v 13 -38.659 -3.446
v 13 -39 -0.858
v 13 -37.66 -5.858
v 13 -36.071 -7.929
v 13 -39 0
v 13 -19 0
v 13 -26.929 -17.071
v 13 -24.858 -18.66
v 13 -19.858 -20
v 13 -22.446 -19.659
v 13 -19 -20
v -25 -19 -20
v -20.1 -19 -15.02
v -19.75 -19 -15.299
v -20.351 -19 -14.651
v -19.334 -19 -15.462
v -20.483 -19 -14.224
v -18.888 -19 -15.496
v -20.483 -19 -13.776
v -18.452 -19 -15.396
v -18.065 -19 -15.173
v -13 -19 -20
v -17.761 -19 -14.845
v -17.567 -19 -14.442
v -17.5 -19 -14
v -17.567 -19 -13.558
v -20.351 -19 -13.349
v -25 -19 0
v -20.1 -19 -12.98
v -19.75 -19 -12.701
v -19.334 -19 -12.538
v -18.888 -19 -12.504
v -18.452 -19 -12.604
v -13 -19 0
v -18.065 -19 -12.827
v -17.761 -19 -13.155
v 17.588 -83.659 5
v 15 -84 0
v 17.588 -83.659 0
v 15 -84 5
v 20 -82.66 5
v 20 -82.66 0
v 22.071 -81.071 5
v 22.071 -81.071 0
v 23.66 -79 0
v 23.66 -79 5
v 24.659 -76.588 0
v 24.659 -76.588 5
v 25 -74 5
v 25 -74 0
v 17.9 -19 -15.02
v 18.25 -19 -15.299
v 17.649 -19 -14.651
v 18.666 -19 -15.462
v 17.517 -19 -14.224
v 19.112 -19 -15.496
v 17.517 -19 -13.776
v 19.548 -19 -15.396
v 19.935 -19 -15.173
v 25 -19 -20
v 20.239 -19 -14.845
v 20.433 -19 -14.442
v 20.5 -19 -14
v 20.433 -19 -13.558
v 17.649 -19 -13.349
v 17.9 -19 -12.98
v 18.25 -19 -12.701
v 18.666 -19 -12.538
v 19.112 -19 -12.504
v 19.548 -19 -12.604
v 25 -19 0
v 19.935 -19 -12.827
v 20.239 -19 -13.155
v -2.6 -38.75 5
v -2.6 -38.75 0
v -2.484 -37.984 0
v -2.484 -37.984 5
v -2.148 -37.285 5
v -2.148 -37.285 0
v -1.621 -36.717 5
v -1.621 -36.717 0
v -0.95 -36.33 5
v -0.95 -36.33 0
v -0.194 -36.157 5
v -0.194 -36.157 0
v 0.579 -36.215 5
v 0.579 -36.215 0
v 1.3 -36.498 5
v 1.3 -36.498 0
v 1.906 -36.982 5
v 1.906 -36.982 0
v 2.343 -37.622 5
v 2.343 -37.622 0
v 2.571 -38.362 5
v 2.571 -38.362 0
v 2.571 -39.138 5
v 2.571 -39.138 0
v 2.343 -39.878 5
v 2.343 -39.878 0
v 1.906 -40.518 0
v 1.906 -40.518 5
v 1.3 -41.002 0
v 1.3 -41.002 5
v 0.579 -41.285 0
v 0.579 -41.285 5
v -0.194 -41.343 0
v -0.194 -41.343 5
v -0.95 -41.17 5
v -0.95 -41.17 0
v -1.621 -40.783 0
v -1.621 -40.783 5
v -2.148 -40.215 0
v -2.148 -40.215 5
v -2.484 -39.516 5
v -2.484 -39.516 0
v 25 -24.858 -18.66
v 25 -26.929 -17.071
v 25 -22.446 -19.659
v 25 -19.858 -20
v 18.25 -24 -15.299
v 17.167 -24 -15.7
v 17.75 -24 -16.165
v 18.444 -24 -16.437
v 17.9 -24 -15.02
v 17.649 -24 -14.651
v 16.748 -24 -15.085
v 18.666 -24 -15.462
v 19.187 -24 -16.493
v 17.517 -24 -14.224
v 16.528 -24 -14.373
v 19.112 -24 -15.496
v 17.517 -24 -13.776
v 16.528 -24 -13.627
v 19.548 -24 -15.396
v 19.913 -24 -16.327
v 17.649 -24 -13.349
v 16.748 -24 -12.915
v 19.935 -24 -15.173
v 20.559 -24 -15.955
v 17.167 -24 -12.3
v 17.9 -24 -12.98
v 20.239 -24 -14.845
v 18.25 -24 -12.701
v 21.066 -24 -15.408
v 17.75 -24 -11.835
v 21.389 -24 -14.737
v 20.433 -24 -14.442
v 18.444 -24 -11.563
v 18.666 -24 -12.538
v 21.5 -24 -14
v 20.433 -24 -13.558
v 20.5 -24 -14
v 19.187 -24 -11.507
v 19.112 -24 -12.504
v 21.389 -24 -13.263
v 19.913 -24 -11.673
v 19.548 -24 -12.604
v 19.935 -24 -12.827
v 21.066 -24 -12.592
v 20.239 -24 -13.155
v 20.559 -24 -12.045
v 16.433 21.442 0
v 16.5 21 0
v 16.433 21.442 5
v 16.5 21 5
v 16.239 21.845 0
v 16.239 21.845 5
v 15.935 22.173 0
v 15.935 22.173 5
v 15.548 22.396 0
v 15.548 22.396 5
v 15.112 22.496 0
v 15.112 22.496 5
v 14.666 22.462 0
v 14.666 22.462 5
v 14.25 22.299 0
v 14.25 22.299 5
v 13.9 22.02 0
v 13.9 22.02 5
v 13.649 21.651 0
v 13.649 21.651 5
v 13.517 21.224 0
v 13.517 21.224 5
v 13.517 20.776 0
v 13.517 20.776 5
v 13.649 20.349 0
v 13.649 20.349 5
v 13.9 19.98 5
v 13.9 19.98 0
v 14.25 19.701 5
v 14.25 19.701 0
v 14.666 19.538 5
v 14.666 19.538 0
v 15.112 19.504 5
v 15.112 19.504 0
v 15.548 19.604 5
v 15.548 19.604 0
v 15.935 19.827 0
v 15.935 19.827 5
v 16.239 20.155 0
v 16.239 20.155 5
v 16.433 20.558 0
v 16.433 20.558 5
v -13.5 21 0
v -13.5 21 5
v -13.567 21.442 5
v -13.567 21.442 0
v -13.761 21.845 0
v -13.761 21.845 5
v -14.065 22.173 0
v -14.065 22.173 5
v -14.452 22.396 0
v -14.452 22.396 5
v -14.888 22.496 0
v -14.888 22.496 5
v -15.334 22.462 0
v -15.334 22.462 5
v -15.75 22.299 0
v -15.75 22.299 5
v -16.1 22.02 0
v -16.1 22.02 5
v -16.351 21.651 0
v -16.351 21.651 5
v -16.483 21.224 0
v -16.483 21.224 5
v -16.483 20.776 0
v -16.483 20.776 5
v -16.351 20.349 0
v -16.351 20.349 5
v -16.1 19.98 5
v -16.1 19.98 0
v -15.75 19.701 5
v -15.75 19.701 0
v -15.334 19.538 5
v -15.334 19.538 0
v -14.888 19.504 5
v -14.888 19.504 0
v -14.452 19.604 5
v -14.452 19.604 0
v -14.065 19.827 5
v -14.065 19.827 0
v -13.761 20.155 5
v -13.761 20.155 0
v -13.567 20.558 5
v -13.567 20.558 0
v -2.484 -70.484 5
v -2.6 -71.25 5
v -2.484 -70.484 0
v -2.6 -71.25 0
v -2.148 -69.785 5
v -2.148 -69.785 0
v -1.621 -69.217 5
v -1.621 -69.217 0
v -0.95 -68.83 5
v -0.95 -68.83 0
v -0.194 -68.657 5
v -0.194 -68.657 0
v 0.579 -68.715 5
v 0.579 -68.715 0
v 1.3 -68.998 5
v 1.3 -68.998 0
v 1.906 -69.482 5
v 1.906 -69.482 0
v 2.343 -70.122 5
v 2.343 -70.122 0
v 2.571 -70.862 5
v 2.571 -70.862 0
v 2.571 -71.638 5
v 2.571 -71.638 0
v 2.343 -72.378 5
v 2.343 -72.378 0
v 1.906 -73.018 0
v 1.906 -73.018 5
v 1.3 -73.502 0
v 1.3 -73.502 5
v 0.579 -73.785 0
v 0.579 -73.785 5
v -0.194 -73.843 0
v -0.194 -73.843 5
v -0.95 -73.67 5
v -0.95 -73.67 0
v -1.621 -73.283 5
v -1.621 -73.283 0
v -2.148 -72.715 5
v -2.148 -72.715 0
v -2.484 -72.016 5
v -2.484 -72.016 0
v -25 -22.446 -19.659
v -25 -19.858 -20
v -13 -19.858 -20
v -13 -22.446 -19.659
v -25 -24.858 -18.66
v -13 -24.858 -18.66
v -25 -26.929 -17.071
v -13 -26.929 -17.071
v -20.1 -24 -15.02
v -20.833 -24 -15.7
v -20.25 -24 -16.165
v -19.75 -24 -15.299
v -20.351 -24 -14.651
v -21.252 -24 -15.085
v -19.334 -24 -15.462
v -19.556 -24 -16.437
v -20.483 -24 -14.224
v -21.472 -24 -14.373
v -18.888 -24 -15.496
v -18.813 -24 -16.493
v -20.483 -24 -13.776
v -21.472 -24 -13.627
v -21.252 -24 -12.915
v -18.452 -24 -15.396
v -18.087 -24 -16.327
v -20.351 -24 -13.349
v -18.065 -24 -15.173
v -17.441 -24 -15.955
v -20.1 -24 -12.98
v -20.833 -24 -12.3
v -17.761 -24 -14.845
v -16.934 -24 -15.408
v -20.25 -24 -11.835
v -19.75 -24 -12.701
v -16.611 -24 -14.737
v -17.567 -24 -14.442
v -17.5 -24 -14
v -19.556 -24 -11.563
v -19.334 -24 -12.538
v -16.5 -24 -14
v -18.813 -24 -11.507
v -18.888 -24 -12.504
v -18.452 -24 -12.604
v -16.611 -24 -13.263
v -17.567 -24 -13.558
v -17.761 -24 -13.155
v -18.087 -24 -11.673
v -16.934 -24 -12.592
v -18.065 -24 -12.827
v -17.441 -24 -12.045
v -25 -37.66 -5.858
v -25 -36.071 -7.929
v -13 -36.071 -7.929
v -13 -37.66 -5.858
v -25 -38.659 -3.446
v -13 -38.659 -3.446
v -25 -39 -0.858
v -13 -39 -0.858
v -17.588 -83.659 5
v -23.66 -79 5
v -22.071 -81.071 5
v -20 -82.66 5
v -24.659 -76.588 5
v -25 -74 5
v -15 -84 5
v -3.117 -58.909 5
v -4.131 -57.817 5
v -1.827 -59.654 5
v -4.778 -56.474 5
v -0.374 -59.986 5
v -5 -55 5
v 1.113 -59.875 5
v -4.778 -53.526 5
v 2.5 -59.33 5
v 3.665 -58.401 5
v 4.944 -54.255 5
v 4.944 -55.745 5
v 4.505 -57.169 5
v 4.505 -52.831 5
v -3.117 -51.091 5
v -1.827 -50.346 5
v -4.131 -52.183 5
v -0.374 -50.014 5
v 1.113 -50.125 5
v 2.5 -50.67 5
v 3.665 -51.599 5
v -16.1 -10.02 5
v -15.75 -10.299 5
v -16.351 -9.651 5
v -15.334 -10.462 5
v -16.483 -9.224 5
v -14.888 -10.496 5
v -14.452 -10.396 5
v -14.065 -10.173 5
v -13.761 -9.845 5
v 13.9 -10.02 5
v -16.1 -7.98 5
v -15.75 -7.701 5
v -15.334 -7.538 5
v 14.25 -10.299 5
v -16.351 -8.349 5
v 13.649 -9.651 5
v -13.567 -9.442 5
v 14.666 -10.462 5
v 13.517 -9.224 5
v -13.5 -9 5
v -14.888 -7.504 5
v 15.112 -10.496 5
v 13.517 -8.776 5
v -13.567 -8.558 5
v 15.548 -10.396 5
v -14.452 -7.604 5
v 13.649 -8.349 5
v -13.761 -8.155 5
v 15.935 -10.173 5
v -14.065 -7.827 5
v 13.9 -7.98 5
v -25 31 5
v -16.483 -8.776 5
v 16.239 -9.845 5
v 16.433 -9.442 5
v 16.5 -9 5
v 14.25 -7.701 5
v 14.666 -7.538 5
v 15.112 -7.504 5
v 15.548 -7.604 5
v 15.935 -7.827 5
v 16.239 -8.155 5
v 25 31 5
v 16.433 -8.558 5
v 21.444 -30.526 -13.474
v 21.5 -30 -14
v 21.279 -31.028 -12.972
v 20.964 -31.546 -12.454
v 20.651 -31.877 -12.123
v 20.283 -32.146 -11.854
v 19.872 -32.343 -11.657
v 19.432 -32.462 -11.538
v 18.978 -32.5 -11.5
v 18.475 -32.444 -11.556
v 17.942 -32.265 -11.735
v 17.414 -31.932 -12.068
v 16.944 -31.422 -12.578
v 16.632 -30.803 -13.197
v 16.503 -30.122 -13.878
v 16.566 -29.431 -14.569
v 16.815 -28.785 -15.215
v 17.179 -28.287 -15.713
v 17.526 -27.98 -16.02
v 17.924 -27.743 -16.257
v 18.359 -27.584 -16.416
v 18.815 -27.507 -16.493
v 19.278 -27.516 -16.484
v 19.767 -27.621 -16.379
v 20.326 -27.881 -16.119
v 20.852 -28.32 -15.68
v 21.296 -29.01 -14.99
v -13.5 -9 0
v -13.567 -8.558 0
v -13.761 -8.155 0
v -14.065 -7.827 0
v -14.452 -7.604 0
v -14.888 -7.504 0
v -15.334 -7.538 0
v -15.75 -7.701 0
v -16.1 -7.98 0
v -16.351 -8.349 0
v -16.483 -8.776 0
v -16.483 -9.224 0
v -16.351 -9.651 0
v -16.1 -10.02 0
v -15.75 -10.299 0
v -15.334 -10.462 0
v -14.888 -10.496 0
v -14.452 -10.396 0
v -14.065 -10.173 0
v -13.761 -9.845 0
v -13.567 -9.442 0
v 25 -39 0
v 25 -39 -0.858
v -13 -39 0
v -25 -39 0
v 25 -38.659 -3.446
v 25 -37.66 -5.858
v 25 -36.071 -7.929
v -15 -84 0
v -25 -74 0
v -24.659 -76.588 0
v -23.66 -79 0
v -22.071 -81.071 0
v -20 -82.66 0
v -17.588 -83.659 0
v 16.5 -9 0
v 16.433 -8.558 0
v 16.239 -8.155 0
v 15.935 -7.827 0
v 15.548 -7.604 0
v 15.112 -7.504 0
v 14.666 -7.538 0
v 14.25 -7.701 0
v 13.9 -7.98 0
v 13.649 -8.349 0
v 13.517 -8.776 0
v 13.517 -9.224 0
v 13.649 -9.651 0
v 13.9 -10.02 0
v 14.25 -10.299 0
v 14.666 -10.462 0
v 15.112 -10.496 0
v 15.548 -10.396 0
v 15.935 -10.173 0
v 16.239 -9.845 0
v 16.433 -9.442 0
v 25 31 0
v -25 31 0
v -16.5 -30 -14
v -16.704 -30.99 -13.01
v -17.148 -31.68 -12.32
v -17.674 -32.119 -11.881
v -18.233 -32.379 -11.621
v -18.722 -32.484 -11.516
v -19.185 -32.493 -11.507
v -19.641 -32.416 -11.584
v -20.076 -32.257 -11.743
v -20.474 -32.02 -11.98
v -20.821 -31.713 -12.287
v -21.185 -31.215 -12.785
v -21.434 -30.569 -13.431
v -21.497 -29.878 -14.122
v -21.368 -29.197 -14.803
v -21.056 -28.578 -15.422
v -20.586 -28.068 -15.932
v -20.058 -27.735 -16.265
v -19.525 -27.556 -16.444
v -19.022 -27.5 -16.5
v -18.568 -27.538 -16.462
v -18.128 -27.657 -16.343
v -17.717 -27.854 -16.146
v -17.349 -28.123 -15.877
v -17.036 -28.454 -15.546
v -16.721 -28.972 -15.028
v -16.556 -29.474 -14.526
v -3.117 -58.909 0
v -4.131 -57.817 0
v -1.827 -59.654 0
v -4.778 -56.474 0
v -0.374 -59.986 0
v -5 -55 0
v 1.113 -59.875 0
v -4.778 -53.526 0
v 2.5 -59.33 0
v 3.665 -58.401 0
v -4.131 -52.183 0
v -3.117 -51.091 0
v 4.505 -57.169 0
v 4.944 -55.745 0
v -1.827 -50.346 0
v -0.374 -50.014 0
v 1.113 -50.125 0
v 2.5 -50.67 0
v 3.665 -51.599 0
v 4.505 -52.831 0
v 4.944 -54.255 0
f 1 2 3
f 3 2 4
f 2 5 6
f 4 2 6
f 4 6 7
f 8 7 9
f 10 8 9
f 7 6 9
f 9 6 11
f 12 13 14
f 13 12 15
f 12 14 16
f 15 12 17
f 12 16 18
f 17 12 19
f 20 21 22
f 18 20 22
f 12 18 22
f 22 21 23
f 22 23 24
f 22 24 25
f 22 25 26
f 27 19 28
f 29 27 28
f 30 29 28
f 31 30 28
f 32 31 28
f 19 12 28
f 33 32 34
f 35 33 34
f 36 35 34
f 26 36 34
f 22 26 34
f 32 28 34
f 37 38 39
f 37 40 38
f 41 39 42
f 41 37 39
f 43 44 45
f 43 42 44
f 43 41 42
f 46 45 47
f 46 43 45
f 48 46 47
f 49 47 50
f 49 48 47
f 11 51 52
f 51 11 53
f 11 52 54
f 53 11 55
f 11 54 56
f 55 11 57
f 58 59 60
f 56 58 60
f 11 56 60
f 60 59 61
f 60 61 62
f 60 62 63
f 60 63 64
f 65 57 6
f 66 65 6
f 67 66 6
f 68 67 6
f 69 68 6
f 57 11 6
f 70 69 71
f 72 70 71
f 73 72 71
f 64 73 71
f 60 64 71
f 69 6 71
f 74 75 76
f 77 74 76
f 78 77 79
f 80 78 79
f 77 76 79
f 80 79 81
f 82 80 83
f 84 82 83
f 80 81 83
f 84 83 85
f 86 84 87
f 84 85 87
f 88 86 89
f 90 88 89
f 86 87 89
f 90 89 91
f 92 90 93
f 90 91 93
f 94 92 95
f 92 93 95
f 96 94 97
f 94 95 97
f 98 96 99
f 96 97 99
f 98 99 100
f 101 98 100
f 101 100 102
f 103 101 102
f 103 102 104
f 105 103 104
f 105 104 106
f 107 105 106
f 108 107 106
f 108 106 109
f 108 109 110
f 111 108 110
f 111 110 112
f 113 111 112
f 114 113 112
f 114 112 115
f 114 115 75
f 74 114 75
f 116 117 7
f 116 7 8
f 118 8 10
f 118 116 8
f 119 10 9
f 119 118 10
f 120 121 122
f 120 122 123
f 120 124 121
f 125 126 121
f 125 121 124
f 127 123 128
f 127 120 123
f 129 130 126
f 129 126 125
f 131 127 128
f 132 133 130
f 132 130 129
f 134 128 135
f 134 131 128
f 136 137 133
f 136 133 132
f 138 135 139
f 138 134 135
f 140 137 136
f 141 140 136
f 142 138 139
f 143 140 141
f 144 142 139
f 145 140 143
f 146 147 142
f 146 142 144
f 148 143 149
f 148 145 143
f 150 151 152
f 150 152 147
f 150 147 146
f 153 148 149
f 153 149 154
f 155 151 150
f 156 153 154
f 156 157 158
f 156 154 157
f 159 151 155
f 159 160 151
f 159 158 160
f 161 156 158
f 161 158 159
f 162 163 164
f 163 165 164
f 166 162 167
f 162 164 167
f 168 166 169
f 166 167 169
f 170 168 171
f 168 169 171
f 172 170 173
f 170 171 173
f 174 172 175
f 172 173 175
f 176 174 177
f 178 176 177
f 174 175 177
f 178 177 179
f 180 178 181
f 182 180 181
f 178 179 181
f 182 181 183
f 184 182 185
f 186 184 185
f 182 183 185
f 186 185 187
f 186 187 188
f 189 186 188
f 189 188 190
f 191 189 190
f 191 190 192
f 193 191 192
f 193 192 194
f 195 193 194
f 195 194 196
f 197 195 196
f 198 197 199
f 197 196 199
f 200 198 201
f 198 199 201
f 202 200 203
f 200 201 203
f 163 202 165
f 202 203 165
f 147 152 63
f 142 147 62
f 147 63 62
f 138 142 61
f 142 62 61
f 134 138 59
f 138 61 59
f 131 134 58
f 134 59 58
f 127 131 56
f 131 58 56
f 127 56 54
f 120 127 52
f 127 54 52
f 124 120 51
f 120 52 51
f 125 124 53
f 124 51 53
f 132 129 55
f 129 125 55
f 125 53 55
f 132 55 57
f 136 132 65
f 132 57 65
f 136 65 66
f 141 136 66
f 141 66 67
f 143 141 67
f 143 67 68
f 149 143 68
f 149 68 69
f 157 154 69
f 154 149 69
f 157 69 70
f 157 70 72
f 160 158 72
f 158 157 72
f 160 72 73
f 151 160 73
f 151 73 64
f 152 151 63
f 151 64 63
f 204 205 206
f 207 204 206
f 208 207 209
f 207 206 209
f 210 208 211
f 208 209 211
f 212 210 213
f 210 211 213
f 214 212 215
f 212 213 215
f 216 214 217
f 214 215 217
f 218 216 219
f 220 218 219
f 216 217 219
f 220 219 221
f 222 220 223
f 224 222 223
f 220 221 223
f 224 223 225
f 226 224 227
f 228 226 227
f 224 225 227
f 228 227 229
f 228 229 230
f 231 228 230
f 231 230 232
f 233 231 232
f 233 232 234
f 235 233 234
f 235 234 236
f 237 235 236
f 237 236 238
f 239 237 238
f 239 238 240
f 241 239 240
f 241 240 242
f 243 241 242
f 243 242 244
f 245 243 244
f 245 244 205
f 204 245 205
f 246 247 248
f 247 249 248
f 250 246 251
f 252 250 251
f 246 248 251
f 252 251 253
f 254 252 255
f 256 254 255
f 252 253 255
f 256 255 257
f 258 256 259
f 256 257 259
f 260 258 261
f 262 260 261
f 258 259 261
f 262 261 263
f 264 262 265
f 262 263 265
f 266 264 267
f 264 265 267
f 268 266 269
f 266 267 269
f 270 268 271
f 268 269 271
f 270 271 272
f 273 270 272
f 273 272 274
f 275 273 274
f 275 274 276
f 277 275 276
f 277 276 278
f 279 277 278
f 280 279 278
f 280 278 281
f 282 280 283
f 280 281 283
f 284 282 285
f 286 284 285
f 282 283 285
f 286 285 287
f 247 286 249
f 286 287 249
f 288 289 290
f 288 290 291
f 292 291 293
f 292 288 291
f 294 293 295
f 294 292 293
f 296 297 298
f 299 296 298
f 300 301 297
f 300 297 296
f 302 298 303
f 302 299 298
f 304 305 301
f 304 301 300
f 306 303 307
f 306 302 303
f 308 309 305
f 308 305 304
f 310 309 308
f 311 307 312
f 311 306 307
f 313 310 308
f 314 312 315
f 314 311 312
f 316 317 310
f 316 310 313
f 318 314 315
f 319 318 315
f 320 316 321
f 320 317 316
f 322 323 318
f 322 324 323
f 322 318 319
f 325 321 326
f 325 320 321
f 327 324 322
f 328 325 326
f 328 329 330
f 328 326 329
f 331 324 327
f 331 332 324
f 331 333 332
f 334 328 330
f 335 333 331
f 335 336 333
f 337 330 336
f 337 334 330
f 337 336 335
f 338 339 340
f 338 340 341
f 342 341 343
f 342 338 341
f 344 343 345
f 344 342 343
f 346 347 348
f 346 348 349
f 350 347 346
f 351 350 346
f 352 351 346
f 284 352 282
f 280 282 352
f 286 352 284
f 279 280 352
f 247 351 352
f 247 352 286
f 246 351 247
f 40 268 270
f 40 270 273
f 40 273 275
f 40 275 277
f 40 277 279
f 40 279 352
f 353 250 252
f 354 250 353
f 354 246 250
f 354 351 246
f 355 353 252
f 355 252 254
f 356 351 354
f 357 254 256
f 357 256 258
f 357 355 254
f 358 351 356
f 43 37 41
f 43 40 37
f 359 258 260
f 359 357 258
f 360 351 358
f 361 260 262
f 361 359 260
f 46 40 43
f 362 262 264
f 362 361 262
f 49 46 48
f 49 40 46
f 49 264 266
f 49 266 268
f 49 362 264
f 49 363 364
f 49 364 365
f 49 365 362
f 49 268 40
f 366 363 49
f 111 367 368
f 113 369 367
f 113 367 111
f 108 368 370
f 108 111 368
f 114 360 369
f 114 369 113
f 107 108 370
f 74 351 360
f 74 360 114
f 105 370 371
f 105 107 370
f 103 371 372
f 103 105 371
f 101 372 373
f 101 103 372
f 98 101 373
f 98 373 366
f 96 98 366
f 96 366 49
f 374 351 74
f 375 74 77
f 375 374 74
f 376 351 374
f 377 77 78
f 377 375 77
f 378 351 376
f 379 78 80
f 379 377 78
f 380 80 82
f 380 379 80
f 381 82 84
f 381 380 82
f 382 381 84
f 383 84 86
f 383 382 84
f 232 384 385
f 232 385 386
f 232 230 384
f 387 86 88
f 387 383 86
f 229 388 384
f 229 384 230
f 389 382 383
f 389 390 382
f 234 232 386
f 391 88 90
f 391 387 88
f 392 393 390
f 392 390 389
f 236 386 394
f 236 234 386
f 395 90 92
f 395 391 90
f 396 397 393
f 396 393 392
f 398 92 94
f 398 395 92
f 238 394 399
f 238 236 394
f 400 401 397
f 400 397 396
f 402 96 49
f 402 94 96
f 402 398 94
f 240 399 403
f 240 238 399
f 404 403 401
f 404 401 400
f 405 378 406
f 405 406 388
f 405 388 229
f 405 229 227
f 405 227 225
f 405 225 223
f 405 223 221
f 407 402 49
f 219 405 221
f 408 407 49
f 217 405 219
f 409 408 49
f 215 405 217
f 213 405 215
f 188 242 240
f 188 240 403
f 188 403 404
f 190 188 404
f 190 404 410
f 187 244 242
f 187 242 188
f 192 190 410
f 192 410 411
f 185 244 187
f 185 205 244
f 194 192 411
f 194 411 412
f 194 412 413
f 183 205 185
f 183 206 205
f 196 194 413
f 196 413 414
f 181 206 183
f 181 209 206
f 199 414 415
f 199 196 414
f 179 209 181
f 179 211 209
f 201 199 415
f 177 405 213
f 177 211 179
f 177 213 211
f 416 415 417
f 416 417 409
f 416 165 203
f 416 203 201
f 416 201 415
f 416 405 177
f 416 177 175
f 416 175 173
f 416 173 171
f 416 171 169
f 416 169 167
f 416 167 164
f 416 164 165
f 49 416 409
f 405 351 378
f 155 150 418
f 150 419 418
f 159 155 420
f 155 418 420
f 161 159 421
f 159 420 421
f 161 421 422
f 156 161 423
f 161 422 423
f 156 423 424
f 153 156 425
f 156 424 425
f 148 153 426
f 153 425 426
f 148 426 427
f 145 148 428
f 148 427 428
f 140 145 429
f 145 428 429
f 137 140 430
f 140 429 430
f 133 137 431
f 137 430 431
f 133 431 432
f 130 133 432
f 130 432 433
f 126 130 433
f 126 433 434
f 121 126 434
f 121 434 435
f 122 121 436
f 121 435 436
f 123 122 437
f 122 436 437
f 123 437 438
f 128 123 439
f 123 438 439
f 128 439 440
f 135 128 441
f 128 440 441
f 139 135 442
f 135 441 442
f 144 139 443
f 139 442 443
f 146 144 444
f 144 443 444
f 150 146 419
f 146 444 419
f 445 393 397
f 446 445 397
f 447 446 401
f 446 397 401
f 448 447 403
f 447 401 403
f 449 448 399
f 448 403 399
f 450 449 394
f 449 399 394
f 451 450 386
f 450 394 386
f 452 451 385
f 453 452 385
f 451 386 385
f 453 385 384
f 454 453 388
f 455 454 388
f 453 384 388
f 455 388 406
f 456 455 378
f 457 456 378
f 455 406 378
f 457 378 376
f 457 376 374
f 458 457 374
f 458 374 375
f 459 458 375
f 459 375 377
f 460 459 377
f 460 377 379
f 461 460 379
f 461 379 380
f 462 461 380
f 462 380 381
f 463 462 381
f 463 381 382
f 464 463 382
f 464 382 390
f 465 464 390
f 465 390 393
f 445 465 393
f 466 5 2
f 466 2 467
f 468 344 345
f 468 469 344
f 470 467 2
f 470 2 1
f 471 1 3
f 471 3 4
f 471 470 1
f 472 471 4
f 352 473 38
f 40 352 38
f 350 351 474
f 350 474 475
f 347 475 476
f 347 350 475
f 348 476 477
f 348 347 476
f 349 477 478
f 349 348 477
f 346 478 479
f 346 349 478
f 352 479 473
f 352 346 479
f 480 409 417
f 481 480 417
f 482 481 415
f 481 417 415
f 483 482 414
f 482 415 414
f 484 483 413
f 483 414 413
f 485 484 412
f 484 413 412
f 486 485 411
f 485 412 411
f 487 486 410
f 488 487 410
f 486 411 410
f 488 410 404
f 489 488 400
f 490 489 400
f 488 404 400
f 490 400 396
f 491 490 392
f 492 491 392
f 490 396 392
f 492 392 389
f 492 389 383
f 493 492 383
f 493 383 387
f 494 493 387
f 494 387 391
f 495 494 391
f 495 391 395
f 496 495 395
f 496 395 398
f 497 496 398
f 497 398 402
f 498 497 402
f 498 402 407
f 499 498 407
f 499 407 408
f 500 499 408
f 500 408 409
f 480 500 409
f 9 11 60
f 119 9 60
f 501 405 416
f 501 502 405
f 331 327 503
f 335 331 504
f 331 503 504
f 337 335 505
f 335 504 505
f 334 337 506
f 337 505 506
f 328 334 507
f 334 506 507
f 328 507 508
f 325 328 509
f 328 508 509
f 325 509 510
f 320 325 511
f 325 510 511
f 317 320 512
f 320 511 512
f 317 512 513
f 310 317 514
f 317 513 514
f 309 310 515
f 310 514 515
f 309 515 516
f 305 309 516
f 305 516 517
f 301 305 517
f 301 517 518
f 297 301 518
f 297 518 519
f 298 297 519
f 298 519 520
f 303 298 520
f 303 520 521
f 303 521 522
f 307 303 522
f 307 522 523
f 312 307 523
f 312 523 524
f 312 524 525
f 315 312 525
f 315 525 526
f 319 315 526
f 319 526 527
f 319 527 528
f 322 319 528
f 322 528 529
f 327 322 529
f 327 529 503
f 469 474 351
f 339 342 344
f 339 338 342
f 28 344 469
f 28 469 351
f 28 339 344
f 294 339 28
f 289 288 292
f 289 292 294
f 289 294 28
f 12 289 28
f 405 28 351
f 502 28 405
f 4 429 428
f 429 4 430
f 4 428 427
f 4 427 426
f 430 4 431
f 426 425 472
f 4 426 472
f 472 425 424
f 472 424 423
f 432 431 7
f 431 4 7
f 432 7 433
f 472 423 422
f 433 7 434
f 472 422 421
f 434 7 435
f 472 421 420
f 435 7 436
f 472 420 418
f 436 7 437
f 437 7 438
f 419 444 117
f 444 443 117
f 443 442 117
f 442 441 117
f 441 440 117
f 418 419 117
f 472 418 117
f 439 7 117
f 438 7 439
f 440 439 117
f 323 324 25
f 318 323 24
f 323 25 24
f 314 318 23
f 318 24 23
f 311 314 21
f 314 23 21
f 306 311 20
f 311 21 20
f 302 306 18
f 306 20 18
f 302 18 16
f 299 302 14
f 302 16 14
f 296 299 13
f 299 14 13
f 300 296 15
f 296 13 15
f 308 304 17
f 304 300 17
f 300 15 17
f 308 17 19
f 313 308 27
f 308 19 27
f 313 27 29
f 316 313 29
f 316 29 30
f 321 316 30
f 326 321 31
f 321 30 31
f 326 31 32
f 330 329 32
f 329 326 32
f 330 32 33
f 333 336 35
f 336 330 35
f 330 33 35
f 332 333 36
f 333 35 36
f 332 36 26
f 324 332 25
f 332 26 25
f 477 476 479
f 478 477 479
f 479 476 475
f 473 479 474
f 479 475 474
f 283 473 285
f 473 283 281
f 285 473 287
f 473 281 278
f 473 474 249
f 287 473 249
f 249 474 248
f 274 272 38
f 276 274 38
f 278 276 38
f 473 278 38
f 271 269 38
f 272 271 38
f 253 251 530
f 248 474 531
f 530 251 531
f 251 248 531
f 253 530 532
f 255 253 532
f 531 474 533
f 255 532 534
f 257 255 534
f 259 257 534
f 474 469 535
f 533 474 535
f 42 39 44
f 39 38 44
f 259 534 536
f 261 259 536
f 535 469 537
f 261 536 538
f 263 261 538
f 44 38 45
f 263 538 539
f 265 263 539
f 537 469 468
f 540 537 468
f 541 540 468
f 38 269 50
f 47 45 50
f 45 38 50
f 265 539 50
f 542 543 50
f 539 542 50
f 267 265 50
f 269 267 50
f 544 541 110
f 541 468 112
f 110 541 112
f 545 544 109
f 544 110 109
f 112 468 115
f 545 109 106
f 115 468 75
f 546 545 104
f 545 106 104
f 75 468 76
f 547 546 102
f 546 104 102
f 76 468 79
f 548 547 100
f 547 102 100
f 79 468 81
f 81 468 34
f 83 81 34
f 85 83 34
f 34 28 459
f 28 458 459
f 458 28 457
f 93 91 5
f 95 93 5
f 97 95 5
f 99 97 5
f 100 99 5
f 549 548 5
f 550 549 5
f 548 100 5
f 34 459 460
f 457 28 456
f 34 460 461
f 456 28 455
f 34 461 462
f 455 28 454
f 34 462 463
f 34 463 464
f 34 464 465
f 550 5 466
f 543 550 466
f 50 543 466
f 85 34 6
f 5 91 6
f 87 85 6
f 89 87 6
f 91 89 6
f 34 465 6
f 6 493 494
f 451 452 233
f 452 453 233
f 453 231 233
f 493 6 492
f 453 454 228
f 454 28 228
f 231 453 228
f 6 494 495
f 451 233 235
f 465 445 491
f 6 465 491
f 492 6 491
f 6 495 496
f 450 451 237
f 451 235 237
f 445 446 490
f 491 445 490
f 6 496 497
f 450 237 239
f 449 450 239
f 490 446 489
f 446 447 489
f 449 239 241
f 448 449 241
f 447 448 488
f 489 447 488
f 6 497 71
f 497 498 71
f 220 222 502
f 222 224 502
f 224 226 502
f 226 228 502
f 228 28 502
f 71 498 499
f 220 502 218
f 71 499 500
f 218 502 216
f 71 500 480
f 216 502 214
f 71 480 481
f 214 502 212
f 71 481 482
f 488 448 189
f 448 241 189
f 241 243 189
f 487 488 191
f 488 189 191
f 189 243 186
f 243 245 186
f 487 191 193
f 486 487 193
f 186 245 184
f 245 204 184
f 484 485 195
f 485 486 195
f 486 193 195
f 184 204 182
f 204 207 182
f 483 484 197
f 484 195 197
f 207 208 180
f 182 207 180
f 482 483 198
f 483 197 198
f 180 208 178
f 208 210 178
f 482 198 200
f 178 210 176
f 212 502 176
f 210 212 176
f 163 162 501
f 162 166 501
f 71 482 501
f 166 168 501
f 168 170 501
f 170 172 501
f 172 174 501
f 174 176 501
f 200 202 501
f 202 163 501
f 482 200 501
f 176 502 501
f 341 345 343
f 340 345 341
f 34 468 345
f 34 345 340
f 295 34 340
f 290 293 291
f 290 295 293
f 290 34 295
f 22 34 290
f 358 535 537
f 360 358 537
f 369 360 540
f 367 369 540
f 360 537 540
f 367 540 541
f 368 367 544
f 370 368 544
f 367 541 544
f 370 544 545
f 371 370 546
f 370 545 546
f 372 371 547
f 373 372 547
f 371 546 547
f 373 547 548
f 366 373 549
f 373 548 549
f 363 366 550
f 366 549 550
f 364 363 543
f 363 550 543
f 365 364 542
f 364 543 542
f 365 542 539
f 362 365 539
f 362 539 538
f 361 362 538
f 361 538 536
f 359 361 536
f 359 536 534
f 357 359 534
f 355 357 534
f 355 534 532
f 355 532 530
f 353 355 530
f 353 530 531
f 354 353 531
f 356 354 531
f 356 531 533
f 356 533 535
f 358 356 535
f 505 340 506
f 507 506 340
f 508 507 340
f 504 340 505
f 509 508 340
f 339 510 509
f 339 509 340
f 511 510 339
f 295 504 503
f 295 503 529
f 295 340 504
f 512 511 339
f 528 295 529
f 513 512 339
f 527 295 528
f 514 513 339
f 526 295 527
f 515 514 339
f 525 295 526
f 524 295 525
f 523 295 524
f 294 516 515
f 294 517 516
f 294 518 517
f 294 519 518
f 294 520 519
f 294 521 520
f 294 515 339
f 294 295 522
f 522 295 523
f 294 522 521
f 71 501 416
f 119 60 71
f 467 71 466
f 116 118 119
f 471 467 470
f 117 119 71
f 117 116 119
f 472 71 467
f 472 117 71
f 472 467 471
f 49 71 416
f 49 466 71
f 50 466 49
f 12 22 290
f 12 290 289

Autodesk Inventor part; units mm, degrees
ref_plane "YZ Plane" through (0, 0, 0) normal (1, 0, 0) x (0, 1, 0)
ref_plane "XZ Plane" through (0, 0, 0) normal (0, 1, 0) x (-1, 0, 0)
ref_plane "XY Plane" through (0, 0, 0) normal (0, 0, 1) x (1, 0, 0)
sketch "Sketch1" plane through (0, 0, 0) normal (0, 0, 1) x (1, 0, 0)
  line L0 (25, -19) -> (-25, -19) projected
  line L1 (-25, 31) -> (25, 31)
  line L2 (25, 31) -> (25, -69)
  line L3 (25, -69) -> (-25, -69)
  line L4 (-25, -69) -> (-25, 31)
  line L5 (-25, 31) -> (25, -69) construction
  line L6 (25, 31) -> (-25, -69) construction
  line L7 (25, -69) -> (-25, -69)
  line L8 (-25, -69) -> (-25, -119)
  line L9 (-25, -119) -> (25, -119)
  line L10 (25, -119) -> (25, -69)
  point P0 (0, 0)
  point P1 (0, -19)
  dimension "d0" = 50
  dimension "d1" = 100
  dimension "d2" = 50
  dimension "d3" = 50
extrude "Extrusion1" add sketch "Sketch1" along normal blind 5
fillet "Fillet1" radius 10 2 edges at (25, -119, 2.5) (-25, -119, 2.5)
ref_plane "Work Plane1" through (-15, -19, 0) normal (0, -1, 0) x (1, 0, 0)
sketch "Sketch2" plane through (-15, -19, 0) normal (0, -1, 0) x (1, 0, 0)
  line L0 (40, -0.5) -> (-10, -0.5) projected
  line L1 (-10, -0.5) -> (-10, -3.5) projected
  line L2 (40, -3.5) -> (-10, -3.5) projected
  line L3 (40, -0.5) -> (40, -3.5) projected
  line L4 (-10, -3.5) -> (40, -3.5) projected
  line L5 (-10, -3.5) -> (-10, -53.5) projected
  line L6 (-10, -53.5) -> (40, -53.5) projected
  line L7 (40, -53.5) -> (40, -3.5) projected
  line L8 (40, -3.5) -> (-10, -3.5) projected
  ellipse E0 centre (15, -28.5) end of major axis (18.5, -28.5) minor radius 3.5 projected
  line L9 (-10, 0) -> (0, 0) projected
  line L10 (40, 0) -> (-10, 0) projected
  line L11 (30, 0) -> (40, 0) projected
  line L12 (0, 0) -> (30, 0) projected
  line L13 (25, -0.5) -> (5, -0.5) projected
  line L14 (5, -0.5) -> (5, -20.5) projected
  line L15 (25, -20.5) -> (5, -20.5) projected
  line L16 (25, -0.5) -> (25, -20.5) projected
  line L17 (40, 0) -> (28, 0)
  line L18 (28, 0) -> (28, -20)
  line L19 (28, -20) -> (40, -20)
  line L20 (40, -20) -> (40, 0)
  line L21 (-10, 0) -> (2, 0)
  line L22 (2, 0) -> (2, -20)
  line L23 (2, -20) -> (-10, -20)
  line L24 (-10, -20) -> (-10, 0)
  point P0 (15, 0)
  dimension "d8" = 12
  dimension "d9" = 20
  dimension "d10" = 12
  dimension "d11" = 20
extrude "Extrusion2" add sketch "Sketch2" along normal blind 20 contours L18 L10 L20 L0 | L0 L3 L2 L18 | L22 L2 L1 L0 | L0 L24 L9 L10 L22 | L2 L7 L19 L18 | L22 L23 L5 L2
chamfer "Chamfer1" distance 15 angle 45 2 edges at (-19, -39, -20) (19, -39, -20)
fillet "Fillet2" radius 10 2 edges at (-19, -24, -20) (-19, -39, -5)
fillet "Fillet3" radius 10 2 edges at (19, -39, -5) (19, -24, -20)
sketch "Sketch3" plane through (0, 0, 5) normal (0, 0, 1) x (1, 0, 0)
  line L0 (25, -109) -> (25, 31) projected
  line L1 (-25, 31) -> (-25, -109) projected
  line L2 (25, 31) -> (-25, 31)
  line L3 (-25, 31) -> (-25, -19)
  line L4 (-25, -19) -> (25, -19)
  line L5 (25, -19) -> (25, 31)
  line L6 (-15, 51) -> (15, 51)
  line L7 (15, 51) -> (15, 21)
  line L8 (15, 21) -> (-15, 21)
  line L9 (-15, 21) -> (-15, 51)
  line L10 (-15, 51) -> (15, 21) construction
  line L11 (15, 51) -> (-15, 21) construction
  circle A0 centre (15, 21) radius 1.5
  circle A1 centre (15, 51) radius 1.5
  circle A2 centre (-15, 51) radius 1.5
  circle A3 centre (-15, 21) radius 1.5
  point P0 (0, 0)
  point P1 (0, 36)
  dimension "d19" = 50
  dimension "d20" = 30
  dimension "d21" = 30
  dimension "d22" = 3
  dimension "d23" = 3
  dimension "d24" = 3
  dimension "d25" = 3
extrude "Extrusion3" cut sketch "Sketch3" against normal blind 20 contours A1 L6 L7 | L7 L6 A1 | A0 L8 L7 | L7 L8 A0 | A3 L8 L9 | L9 L8 A3 | A2 L6 L9 | L9 L6 A2
sketch "Sketch4" plane through (-15, -19, 0) normal (0, 1, 0) x (1, 0, 0)
  line L0 (-10, 0) -> (-10, 20) projected
  line L1 (-10, 20) -> (2, 20)
  line L2 (2, 20) -> (2, 8)
  line L3 (2, 8) -> (-10, 8)
  line L4 (-10, 8) -> (-10, 20)
  circle A0 centre (-4, 14) radius 1.5
  circle A1 centre (34, 14) radius 1.5
  point P0 (15, 0)
  dimension "d28" = 12
  dimension "d29" = 12
  dimension "d30" = 3
  dimension "d33" = 38
extrude "Extrusion4" cut sketch "Sketch4" against normal through all contours A0 | A1
sketch "Sketch5" plane through (-15, -39, 0) normal (0, -1, 0) x (1, 0, 0)
  circle A0 centre (34, -14) radius 1.5 projected
  circle A1 centre (-4, -14) radius 1.5 projected
  circle A2 centre (34, -14) radius 2.5
  circle A3 centre (-4, -14) radius 1.5 projected
  circle A4 centre (-4, -14) radius 2.5
  point P0 (15, 0)
  dimension "d40" = 5
  dimension "d41" = 5
extrude "Extrusion5" cut sketch "Sketch5" against normal blind 15
sketch "Sketch6" plane through (0, 0, 0) normal (0, 0, -1) x (-1, 0, 0)
  circle A0 centre (0, -55) radius 5
  circle A1 centre (0, -38.75) radius 2.6
  circle A2 centre (0, -71.25) radius 2.6
  point P0 (0, 0)
  dimension "d44" = 10
  dimension "d45" = 16.25
  dimension "d46" = 16.25
  dimension "d47" = 5.2
  dimension "d48" = 5.2
  dimension "d51" = 55
extrude "Extrusion6" cut sketch "Sketch6" against normal blind 15
sketch "Sketch7" plane through (0, 0, 0) normal (0, 0, -1) x (-1, 0, 0)
  line L0 (25, 31) -> (25, -109) projected
  line L1 (25, -84) -> (-25, -84)
  line L2 (-25, -109) -> (-25, 31) projected
  line L3 (25, -84) -> (75, -84) construction
  line L4 (15, -119) -> (-15, -119) projected
  circle A0 centre (0, -71.25) radius 2.6 projected
  circle A1 centre (0, -38.75) radius 2.6 projected
  circle A2 centre (0, -55) radius 5 projected
  circle A3 centre (15, 21) radius 1.5 projected
  circle A4 centre (-15, 21) radius 1.5 projected
  line L5 (-13, -39) -> (-25, -39) projected
  line L6 (-25, -109) -> (-25, -39) projected
  arc A5 (-25, -109) -> (-15, -119) centre (-15, -109) ccw projected
  line L7 (15, -119) -> (-15, -119) projected
  arc A6 (15, -119) -> (25, -109) centre (15, -109) ccw projected
  line L8 (25, -39) -> (25, -109) projected
  line L9 (25, -39) -> (13, -39) projected
  line L10 (13, -39) -> (13, -19) projected
  line L11 (13, -19) -> (25, -19) projected
  line L12 (25, 31) -> (25, -19) projected
  line L13 (-25, 31) -> (25, 31) projected
  line L14 (-25, -19) -> (-25, 31) projected
  line L15 (-25, -19) -> (-13, -19) projected
  line L16 (-13, -19) -> (-13, -39) projected
  point P0 (0, 0)
  point P1 (-15, -119)
  point P2 (15, -119)
  dimension "d52" = 50
  dimension "d53" = 180
  dimension "d54" = 35
extrude "Extrusion7" cut sketch "Sketch7" against normal blind 15 contours L0 L9 L10 L11 | L15 L16 L5 L2 | L0 A6 L4 A5 L2 L1
fillet "Fillet4" radius 10 2 edges at (25, -84, 2.5) (-25, -84, 2.5)
sketch "Sketch8" plane through (13, -19, 0) normal (0, -1, 0) x (1, 0, 0)
  line L0 (0, 5) -> (12, 5) projected
  line L1 (0, 0) -> (0, 5) projected
  line L2 (12, 0) -> (0, 0) projected
  line L3 (12, 5) -> (12, 0) projected
  line L4 (-38, 5) -> (-26, 5) projected
  line L5 (-38, 0) -> (-38, 5) projected
  line L6 (-26, 0) -> (-38, 0) projected
  line L7 (-26, 0) -> (-26, 5) projected
  point P0 (-13, 0)
extrude "Extrusion8" add sketch "Sketch8" along normal up to surface (20 mm away)
sketch "Sketch9" plane through (0, 0, 5) normal (0, 0, 1) x (1, 0, 0)
  circle A0 centre (15, 21) radius 1.5 projected
  line L0 (15, 21) -> (-15, 21)
  line L1 (-15, 21) -> (-15, -9)
  line L2 (-15, -9) -> (15, -9)
  line L3 (15, -9) -> (15, 21)
  circle A1 centre (15, -9) radius 1.5
  circle A2 centre (-15, -9) radius 1.5
  point P0 (0, 0)
  dimension "d60" = 30
  dimension "d61" = 3
  dimension "d62" = 3
extrude "Extrusion9" cut sketch "Sketch9" against normal through all contours A1 L2 L3 | L3 L2 A1 | A2 L2 L1 | L1 L2 A2
properties part number "3d mount for linear bearing"
